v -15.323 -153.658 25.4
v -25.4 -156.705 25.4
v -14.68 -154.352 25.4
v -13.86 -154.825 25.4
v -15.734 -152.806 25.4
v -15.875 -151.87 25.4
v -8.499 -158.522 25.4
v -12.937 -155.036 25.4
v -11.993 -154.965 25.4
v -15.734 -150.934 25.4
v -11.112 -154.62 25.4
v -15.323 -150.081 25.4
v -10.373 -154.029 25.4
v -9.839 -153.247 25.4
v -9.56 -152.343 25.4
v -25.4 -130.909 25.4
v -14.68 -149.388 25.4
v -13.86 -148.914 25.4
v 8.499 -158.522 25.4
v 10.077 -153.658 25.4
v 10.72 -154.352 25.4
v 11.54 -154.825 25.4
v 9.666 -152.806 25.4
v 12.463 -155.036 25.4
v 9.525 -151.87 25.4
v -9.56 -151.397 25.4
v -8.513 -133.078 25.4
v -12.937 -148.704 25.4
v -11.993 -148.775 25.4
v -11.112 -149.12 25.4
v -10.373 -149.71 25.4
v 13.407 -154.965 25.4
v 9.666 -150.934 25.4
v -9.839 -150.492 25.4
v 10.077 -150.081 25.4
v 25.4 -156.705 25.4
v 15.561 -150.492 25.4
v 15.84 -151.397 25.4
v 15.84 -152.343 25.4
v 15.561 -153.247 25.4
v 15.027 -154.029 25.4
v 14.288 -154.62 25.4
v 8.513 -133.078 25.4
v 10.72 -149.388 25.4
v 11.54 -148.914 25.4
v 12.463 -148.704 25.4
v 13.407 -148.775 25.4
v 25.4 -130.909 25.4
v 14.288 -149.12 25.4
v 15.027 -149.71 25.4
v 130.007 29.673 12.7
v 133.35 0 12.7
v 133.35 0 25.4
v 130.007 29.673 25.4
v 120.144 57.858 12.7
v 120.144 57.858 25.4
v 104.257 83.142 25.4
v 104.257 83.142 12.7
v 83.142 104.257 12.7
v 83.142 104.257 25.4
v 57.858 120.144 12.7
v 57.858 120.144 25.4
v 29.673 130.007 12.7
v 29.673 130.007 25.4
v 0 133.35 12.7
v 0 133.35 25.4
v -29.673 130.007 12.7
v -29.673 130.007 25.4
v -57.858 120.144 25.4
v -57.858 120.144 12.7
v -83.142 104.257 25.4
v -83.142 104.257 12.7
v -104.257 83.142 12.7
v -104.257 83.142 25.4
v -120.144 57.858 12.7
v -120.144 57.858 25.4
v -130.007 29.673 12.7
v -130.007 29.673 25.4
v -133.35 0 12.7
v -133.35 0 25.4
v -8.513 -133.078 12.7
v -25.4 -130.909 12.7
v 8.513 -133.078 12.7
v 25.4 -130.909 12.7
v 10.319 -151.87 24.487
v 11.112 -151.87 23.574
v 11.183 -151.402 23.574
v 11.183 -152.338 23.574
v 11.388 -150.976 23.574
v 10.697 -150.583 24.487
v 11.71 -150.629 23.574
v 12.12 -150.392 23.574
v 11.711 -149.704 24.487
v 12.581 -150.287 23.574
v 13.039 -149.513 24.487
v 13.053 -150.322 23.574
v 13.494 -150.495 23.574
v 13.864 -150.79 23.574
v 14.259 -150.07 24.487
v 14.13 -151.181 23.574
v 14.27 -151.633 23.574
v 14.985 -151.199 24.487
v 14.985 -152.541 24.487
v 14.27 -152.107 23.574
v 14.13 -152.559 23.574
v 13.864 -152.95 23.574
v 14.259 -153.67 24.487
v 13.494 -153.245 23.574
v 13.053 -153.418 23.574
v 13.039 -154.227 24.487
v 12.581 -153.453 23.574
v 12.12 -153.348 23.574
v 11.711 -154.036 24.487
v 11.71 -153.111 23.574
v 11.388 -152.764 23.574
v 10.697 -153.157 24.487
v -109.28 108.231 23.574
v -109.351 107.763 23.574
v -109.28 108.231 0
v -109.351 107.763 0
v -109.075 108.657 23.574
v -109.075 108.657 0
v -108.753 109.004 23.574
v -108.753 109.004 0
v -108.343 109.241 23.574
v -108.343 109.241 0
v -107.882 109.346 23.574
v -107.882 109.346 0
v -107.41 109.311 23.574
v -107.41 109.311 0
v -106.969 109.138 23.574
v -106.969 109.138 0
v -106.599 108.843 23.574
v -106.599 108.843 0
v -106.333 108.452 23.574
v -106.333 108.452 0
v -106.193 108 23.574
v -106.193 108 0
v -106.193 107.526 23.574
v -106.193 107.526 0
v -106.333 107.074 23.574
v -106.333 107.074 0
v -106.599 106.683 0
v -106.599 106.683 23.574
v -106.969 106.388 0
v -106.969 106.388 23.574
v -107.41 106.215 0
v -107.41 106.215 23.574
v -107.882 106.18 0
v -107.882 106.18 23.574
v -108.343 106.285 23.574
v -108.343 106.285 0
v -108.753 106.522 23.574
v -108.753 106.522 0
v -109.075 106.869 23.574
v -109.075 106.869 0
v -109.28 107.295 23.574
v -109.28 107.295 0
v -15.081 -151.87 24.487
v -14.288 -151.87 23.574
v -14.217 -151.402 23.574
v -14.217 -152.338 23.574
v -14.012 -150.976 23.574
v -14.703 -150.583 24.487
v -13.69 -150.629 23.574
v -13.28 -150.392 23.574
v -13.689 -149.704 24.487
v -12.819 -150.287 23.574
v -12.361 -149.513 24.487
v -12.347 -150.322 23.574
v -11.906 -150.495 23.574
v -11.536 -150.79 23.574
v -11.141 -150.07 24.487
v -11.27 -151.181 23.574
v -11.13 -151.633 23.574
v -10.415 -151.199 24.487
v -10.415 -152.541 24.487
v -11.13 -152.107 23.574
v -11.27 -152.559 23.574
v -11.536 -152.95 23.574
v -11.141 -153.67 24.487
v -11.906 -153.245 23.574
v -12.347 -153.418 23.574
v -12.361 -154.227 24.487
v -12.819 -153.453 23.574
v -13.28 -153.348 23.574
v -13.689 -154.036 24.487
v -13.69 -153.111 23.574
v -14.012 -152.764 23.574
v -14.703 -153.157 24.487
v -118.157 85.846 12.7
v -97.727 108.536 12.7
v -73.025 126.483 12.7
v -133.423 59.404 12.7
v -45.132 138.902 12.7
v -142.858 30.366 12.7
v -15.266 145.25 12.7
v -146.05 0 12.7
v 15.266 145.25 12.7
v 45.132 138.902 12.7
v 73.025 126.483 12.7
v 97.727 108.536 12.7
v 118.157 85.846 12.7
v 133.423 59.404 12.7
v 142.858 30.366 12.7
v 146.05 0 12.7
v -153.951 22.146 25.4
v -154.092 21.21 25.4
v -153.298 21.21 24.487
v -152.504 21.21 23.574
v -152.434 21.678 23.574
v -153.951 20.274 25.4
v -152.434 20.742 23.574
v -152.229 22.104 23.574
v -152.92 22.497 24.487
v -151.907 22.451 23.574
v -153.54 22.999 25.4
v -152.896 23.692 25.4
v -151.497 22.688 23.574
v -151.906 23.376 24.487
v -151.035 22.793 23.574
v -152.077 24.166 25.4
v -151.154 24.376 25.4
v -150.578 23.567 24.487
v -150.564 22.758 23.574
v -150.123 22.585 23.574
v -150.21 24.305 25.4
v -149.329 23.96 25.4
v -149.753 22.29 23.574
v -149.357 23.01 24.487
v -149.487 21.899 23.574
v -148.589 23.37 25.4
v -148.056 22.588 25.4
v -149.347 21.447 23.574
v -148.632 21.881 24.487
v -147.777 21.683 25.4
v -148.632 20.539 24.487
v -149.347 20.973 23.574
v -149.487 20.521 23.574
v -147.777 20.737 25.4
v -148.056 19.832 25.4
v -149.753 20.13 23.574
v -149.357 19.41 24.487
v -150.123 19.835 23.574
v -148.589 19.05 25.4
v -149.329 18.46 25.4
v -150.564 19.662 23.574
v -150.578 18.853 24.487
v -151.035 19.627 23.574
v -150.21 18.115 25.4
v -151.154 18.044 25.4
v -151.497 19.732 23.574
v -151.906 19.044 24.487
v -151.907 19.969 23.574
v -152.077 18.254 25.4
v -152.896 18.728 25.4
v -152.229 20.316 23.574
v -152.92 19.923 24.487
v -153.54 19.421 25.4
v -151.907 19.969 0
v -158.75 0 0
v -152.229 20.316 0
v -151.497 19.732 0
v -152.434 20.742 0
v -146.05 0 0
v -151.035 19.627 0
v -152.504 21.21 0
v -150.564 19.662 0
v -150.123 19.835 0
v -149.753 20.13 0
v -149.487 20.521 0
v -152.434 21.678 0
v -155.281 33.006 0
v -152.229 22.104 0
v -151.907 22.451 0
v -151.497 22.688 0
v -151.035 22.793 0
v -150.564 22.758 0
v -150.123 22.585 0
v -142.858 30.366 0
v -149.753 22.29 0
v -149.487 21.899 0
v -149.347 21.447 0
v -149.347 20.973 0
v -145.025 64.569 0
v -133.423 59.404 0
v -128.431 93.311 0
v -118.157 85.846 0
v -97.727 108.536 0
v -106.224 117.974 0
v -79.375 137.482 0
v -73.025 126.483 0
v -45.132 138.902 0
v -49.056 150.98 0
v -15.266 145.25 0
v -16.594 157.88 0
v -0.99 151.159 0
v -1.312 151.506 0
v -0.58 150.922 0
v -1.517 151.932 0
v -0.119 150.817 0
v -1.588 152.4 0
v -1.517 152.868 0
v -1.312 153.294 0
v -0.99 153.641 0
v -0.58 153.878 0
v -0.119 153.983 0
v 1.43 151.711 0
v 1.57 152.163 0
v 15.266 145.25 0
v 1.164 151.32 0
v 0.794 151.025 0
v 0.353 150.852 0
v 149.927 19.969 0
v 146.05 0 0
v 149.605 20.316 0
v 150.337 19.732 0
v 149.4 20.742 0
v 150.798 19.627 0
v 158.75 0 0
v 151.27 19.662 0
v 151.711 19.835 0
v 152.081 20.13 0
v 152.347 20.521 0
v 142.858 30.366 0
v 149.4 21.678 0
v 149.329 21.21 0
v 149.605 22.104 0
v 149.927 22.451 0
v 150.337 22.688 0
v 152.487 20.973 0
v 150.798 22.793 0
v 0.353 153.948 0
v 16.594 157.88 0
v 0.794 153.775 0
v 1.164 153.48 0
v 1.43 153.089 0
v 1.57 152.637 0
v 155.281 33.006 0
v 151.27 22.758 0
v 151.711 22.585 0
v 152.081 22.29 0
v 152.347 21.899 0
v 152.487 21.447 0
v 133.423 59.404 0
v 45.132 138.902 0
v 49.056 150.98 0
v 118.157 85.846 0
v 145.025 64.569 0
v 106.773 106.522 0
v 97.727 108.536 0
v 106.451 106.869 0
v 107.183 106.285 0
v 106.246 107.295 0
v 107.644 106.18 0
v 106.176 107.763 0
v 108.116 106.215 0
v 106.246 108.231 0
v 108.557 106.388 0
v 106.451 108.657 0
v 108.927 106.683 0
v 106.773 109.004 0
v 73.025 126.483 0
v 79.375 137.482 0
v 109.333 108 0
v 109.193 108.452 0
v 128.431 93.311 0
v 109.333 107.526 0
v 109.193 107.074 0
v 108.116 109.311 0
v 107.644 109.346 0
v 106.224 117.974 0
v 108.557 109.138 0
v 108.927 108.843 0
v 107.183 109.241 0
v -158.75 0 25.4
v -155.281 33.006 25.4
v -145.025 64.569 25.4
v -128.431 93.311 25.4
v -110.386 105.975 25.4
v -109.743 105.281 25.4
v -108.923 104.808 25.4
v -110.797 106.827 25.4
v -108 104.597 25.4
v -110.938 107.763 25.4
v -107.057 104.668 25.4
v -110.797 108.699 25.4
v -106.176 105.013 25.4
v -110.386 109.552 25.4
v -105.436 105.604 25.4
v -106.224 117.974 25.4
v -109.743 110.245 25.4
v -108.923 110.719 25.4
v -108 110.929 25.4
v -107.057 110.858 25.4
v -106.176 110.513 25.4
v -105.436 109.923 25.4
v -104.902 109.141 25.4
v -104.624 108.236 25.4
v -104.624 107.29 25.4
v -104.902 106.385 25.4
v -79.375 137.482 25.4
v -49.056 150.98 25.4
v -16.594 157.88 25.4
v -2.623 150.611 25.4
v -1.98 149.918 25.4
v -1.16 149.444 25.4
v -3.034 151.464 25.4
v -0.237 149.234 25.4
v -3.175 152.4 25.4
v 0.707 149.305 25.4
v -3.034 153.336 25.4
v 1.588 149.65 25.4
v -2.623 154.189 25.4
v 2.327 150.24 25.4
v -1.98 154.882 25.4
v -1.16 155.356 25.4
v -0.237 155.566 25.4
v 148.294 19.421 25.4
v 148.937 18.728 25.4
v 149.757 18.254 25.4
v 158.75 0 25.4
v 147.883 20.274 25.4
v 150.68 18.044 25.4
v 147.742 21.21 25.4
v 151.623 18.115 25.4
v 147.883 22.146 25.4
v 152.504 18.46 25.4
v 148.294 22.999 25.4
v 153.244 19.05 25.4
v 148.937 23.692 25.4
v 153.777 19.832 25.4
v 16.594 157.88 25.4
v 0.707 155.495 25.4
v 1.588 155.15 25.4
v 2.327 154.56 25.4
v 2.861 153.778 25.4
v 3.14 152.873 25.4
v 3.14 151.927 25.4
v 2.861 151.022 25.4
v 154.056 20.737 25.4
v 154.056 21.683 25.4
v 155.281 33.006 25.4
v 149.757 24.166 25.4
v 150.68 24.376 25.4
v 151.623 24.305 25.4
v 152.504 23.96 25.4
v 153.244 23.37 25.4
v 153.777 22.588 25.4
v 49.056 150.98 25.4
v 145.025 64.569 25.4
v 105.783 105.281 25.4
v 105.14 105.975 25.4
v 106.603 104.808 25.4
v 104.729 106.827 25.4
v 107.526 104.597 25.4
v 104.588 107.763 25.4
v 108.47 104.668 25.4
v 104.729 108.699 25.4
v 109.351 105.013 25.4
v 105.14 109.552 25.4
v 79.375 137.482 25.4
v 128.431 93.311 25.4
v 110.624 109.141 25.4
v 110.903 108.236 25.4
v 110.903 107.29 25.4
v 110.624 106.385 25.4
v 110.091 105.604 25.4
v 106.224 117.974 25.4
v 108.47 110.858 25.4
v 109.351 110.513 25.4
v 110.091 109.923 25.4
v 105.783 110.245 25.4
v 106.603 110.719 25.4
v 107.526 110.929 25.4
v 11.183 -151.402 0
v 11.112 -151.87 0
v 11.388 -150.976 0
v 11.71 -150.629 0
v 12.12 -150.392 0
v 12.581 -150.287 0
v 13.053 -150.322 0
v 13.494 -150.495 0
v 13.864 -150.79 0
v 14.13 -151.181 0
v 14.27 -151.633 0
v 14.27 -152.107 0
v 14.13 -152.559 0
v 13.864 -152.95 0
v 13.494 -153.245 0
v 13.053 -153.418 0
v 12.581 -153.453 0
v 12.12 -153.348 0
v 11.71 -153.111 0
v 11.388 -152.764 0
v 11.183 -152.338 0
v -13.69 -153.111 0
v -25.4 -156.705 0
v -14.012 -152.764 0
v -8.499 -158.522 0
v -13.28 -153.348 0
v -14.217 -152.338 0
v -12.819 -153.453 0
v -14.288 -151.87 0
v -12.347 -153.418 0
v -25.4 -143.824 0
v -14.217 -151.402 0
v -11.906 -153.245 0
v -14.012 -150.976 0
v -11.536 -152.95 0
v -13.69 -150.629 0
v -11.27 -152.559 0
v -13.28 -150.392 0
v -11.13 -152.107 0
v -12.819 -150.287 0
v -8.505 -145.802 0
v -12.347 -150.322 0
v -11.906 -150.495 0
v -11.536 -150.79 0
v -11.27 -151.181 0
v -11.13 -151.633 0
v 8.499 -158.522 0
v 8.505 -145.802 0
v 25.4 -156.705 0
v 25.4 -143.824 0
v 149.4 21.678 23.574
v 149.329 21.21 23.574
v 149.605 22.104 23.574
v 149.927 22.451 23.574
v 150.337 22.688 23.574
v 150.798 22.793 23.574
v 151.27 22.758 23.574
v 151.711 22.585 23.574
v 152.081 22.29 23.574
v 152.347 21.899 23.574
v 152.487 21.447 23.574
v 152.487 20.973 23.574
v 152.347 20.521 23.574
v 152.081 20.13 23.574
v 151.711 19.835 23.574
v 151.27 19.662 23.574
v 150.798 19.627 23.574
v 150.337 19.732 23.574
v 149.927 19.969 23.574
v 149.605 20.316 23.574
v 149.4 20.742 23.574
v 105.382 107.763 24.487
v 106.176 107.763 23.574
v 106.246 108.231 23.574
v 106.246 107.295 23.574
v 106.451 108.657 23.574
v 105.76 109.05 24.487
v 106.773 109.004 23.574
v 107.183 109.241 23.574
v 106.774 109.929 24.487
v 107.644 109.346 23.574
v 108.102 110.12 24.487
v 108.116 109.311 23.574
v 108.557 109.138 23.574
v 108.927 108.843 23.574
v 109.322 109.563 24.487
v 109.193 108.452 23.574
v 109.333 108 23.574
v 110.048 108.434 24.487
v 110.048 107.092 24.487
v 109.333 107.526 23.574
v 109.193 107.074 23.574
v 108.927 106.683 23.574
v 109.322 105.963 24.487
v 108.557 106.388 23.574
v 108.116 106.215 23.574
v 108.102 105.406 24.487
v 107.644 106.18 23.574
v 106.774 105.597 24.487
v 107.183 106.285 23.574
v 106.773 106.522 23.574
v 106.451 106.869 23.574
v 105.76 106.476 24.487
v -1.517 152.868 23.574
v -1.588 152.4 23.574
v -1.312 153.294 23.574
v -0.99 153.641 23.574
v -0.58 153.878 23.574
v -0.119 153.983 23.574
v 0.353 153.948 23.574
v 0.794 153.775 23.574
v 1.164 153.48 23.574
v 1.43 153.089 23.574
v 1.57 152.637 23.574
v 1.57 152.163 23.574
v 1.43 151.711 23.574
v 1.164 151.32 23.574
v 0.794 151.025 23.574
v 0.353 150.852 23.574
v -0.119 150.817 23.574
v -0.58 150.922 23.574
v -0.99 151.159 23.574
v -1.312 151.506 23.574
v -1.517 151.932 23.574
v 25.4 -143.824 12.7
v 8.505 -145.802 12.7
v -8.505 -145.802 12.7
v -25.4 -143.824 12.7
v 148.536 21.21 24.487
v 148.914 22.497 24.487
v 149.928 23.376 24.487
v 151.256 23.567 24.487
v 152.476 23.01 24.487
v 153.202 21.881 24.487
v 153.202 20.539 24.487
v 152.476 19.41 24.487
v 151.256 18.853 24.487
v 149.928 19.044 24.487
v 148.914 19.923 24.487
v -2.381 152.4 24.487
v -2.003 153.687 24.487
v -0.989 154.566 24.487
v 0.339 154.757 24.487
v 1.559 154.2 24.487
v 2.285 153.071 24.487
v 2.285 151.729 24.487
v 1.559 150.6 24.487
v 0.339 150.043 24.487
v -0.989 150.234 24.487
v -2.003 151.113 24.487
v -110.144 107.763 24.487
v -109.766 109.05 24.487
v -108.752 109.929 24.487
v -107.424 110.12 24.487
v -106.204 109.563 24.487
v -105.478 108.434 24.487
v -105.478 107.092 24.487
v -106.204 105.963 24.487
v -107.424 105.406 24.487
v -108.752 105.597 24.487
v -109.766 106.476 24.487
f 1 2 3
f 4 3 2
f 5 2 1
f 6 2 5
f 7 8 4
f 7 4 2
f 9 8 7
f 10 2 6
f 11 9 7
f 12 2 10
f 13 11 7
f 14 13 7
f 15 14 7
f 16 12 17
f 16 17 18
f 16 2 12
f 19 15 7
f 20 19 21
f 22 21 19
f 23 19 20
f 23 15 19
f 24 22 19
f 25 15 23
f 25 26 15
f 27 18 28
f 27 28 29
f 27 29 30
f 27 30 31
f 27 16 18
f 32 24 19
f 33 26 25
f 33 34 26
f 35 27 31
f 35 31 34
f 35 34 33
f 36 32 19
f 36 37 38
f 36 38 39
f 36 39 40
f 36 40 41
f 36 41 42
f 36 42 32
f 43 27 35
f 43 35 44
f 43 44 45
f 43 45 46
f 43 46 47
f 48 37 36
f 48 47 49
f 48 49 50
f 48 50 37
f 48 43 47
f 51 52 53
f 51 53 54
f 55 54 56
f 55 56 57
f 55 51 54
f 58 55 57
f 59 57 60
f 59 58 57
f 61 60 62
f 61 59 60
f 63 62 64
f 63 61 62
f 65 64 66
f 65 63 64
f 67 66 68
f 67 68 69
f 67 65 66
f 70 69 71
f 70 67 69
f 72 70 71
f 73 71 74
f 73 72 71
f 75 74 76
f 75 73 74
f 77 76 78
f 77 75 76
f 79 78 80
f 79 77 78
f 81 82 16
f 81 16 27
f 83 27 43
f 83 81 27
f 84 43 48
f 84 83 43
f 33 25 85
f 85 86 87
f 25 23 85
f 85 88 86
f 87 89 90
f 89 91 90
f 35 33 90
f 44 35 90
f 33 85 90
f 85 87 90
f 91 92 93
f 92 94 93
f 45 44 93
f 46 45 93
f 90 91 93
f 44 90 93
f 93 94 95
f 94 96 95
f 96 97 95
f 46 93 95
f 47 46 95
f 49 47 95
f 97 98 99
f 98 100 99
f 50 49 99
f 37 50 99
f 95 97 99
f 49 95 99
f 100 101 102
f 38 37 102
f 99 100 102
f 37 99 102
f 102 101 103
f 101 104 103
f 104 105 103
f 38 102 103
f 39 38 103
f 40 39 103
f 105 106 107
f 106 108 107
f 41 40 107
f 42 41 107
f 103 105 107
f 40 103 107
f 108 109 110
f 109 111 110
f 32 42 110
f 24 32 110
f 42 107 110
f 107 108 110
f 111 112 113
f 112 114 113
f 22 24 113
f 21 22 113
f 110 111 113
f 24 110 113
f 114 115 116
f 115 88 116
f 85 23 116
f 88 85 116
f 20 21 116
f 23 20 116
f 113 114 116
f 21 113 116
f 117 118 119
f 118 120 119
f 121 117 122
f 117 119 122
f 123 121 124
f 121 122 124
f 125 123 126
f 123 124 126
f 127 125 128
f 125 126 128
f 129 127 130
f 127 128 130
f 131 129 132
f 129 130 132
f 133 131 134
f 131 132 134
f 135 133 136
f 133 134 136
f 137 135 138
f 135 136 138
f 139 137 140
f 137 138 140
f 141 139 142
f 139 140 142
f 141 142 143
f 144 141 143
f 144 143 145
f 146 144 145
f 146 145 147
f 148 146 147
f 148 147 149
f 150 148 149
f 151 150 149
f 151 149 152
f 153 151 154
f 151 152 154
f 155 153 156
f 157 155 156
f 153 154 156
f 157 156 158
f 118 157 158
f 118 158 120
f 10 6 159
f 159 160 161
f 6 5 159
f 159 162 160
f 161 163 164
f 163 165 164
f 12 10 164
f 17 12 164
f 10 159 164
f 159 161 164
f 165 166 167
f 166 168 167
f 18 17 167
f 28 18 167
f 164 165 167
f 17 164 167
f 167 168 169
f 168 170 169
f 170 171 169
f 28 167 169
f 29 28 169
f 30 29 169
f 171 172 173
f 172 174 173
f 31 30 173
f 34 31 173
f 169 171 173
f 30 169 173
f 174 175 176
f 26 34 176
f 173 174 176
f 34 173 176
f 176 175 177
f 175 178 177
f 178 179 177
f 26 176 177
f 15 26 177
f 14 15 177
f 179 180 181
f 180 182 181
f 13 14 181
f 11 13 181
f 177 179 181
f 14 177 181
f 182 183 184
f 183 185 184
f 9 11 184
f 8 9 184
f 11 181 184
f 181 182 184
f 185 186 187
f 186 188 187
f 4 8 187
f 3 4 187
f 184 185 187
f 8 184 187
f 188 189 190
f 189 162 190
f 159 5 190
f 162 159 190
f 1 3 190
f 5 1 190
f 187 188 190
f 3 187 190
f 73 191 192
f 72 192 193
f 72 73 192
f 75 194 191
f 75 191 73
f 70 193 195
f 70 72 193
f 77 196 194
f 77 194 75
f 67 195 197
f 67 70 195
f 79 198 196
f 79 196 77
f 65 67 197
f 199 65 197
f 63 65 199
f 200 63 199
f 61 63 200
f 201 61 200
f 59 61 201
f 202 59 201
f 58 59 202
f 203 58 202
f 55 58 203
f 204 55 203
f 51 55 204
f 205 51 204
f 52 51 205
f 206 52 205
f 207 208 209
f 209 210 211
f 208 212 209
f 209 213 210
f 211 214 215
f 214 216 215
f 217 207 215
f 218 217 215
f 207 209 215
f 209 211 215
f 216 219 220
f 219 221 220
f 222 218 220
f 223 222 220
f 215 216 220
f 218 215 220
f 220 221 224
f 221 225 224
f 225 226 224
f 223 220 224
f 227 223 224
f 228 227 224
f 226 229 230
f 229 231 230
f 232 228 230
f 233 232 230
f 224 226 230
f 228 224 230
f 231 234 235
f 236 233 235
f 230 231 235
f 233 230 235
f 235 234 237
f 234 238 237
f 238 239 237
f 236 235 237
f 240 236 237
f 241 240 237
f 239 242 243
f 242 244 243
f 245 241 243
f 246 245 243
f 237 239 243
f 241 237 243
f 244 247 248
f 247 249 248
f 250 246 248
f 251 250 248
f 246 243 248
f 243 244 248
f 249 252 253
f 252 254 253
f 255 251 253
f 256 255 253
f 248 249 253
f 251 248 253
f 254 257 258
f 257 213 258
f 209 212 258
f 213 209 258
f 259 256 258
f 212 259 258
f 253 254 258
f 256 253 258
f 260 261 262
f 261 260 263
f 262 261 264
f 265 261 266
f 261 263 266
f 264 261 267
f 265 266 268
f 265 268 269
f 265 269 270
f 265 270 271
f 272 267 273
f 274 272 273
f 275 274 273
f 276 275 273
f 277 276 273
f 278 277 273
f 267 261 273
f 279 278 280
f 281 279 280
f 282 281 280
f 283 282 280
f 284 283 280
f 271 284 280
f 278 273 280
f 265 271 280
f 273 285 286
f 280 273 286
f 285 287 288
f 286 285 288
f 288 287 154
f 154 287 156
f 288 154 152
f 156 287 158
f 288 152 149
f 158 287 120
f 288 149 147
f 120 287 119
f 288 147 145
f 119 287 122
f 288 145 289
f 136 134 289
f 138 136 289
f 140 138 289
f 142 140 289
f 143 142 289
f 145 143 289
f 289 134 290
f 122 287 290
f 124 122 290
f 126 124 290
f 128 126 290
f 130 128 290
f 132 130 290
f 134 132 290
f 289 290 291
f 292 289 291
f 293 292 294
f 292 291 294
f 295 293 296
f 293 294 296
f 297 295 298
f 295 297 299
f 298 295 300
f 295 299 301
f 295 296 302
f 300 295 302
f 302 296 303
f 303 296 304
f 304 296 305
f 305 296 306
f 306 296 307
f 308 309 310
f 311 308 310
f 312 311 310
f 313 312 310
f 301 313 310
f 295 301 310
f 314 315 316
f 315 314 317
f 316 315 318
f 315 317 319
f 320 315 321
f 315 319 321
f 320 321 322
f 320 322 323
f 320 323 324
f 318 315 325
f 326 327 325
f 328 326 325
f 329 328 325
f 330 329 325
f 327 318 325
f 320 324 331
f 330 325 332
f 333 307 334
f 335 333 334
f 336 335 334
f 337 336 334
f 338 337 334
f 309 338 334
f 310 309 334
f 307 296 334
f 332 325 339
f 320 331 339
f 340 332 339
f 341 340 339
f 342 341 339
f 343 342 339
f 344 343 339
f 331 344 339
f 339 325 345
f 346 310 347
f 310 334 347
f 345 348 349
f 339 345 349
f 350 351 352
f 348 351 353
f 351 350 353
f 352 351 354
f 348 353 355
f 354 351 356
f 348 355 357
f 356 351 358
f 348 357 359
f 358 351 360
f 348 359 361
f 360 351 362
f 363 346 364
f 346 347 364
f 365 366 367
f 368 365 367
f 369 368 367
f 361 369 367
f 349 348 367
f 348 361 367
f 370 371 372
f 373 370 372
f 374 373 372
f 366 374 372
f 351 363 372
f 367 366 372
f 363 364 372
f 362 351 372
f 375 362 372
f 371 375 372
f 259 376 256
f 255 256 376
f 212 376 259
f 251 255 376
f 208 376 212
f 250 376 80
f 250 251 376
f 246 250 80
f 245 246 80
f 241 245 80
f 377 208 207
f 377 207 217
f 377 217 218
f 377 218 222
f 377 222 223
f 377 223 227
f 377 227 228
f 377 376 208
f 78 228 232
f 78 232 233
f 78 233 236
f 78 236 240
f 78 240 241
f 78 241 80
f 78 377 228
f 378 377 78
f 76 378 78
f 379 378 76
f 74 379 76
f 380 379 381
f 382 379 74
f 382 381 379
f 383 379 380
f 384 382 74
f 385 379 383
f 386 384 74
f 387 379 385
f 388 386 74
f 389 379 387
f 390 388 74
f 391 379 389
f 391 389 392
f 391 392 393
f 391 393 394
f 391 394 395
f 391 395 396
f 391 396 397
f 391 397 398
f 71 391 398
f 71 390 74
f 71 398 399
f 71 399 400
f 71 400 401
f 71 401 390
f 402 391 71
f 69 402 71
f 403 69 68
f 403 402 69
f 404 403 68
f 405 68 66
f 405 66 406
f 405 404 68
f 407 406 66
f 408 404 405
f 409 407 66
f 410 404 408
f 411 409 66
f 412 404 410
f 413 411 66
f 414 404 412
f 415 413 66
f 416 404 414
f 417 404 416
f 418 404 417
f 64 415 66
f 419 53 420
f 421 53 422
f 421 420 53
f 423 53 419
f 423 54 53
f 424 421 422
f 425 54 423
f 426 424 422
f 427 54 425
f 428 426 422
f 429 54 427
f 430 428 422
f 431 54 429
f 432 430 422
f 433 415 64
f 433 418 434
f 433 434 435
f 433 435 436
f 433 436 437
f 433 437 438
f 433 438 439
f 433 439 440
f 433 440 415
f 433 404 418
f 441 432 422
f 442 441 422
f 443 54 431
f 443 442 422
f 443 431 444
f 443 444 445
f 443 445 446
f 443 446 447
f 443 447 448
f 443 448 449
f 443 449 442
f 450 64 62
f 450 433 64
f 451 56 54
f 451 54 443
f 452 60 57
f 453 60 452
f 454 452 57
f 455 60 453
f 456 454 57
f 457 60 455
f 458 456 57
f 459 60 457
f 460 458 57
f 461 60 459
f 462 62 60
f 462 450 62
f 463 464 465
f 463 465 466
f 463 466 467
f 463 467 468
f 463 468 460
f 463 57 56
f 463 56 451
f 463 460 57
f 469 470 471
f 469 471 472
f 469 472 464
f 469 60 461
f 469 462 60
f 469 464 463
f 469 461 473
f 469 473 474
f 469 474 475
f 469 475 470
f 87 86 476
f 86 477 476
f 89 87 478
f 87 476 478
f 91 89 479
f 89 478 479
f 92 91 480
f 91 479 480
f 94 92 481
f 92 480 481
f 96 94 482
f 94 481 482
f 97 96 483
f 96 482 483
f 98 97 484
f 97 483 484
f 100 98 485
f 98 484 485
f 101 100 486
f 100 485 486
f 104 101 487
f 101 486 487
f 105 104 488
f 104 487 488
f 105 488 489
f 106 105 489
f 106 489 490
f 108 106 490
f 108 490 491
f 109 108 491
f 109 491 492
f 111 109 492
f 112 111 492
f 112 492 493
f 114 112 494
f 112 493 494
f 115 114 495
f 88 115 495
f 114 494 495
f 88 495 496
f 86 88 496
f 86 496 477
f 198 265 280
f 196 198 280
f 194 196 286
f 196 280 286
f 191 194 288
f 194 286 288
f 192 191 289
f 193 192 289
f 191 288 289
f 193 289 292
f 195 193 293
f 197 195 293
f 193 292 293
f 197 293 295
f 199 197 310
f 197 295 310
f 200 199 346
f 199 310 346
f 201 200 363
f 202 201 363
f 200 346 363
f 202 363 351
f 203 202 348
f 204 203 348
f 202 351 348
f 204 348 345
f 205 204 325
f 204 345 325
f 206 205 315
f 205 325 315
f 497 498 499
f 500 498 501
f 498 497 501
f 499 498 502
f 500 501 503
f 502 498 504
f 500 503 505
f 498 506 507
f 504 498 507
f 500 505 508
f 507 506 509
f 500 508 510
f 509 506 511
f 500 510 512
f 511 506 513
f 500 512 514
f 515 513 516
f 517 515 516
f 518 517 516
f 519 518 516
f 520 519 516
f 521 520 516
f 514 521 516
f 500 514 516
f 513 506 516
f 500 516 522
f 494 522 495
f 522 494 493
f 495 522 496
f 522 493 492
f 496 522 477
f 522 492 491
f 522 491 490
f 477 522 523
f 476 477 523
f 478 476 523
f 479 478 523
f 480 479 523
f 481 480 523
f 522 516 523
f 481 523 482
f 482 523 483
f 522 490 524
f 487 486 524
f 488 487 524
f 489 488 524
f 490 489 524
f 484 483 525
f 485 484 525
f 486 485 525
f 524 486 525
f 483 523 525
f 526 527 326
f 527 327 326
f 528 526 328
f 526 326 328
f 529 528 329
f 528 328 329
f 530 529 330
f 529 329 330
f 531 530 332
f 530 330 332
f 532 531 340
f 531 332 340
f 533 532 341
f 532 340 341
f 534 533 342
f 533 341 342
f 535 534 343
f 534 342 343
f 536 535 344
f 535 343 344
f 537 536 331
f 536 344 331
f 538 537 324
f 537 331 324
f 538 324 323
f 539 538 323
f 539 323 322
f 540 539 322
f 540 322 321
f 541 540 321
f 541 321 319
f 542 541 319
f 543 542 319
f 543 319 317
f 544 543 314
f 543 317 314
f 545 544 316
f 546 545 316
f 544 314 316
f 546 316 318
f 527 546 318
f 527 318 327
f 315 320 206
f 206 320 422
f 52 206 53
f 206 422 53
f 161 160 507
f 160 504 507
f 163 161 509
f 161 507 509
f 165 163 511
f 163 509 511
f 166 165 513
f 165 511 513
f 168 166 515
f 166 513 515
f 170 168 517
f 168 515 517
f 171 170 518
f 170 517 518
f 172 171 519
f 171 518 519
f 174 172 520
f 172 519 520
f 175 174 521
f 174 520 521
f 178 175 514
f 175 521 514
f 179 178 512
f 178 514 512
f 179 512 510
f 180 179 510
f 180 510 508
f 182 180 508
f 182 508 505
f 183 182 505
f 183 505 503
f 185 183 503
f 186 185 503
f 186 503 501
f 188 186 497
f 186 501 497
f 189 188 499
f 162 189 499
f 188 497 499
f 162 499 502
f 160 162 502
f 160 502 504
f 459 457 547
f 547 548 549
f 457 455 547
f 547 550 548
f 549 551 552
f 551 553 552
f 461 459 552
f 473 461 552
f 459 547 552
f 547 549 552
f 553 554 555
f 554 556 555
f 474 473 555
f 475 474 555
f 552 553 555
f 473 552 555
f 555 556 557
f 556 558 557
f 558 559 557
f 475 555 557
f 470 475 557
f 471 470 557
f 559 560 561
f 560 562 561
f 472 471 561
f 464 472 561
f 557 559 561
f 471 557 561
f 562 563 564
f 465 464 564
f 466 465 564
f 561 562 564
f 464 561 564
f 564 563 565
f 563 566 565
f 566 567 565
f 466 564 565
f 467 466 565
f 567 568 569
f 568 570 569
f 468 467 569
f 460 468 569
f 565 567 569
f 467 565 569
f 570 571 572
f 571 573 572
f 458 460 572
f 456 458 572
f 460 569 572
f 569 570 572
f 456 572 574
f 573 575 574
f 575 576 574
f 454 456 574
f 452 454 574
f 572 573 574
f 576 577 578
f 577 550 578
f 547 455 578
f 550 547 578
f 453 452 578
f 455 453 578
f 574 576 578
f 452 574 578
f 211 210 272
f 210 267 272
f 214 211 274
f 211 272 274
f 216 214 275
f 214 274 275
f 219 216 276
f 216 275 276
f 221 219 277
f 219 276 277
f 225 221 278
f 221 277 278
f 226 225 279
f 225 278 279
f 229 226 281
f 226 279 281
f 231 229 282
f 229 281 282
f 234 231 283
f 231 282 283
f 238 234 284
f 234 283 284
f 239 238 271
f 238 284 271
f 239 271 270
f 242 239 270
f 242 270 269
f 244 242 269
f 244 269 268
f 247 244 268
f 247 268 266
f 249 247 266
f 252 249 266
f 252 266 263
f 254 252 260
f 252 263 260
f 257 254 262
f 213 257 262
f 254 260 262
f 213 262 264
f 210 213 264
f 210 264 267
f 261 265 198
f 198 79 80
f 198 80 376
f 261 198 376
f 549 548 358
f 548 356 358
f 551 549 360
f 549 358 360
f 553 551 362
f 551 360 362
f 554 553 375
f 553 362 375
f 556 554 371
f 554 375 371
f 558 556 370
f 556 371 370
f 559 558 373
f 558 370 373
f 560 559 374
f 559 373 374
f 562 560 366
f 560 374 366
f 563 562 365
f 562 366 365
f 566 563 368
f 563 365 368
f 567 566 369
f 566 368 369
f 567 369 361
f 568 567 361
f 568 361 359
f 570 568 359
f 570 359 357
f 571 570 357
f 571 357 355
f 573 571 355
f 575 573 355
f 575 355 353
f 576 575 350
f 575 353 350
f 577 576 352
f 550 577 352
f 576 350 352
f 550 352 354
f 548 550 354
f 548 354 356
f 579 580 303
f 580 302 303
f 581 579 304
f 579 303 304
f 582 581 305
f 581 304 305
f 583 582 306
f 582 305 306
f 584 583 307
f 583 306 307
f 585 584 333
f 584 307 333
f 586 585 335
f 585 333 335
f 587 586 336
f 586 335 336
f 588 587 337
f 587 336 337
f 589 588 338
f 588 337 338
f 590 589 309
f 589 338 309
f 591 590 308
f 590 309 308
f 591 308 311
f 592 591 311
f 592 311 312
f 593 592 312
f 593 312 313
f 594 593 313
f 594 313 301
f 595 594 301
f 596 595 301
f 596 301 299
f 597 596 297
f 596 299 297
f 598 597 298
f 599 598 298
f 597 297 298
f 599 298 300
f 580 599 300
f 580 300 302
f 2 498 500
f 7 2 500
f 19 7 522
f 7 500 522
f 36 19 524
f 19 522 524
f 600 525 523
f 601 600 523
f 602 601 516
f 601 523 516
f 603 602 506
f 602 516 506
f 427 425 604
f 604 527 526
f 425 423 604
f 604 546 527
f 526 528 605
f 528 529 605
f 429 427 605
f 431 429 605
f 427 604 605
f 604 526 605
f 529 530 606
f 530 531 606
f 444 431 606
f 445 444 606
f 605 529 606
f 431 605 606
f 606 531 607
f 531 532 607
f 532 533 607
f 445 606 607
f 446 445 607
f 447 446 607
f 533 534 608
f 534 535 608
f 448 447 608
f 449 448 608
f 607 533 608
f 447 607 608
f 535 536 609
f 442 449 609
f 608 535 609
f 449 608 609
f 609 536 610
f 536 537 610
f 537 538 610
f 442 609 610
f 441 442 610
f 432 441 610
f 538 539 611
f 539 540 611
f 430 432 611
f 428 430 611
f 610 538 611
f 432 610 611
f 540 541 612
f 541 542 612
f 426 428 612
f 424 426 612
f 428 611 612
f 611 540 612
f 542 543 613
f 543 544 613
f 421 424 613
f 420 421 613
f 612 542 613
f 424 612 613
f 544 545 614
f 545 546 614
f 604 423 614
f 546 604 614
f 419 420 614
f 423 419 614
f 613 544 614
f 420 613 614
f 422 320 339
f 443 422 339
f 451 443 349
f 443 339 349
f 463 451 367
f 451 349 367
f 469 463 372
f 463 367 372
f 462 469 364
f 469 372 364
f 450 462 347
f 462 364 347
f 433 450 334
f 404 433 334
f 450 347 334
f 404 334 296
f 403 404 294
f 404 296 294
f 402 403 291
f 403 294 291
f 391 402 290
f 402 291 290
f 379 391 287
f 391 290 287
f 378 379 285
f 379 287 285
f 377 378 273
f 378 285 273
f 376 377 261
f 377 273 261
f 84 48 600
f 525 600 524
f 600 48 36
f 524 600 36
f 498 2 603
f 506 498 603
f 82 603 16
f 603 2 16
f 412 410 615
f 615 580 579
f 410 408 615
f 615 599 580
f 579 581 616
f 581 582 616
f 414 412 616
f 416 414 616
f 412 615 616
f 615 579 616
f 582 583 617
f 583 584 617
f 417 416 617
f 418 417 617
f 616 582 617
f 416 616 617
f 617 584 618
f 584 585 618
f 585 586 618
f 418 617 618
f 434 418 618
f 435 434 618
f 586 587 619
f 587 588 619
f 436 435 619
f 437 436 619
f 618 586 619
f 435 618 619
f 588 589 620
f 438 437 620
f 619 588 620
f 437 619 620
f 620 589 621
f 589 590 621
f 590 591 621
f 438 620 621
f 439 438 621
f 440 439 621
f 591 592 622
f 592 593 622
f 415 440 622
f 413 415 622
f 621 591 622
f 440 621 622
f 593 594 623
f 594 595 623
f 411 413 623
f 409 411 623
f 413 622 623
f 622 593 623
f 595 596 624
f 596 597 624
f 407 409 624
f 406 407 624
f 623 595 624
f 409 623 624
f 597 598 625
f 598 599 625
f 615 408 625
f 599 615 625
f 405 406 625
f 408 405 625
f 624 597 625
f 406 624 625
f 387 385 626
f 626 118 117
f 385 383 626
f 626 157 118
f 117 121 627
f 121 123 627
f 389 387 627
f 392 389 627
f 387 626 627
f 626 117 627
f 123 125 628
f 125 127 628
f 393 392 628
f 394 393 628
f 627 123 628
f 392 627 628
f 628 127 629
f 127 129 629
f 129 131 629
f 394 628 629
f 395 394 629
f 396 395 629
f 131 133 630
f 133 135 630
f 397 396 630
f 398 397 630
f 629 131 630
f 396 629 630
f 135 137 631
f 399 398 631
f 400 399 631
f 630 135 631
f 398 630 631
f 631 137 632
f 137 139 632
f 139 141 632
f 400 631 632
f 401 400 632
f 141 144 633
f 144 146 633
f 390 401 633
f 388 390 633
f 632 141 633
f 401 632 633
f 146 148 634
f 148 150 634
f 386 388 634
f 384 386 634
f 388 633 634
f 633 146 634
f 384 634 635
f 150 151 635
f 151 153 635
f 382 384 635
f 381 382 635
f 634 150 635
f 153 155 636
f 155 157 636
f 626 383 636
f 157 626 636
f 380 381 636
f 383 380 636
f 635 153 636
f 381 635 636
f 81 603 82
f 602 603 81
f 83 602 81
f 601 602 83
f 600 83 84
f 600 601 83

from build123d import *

# Parameters (mm, degrees)
F0_R           = 158.75
F0_R_2         = 133.35
F1_DEPTH       = 25.4
F2_R           = 146.05
F2_R_2         = 133.35
F3_DEPTH       = 12.7
F5_DEPTH       = 25.401
F7_D           = 3.175
F7_DEPTH       = 31.75
F7_CSINK_D     = 6.35
F7_CSINK_ANGLE = 82
F7_TIP         = 0.9538662327


with BuildPart() as f1:
    # F0 (on Top) → F1 (new body)
    with BuildSketch(Plane.XY):
        Circle(F0_R)
        Circle(F0_R_2, mode=Mode.SUBTRACT)
    extrude(amount=F1_DEPTH)

    # F2 (on face) → F3 (cut)
    with BuildSketch(Plane(origin=(0, 0, 0), x_dir=(1, 0, 0), z_dir=(0, 0, -1))):
        Circle(F2_R)
        Circle(F2_R_2, mode=Mode.SUBTRACT)
    extrude(amount=-F3_DEPTH, mode=Mode.SUBTRACT)

    # F4 (on face) → F5 (cut, through all)
    with BuildSketch(Plane.XY.offset(25.4)):
        with BuildLine():
            Line((158.75, 0), (133.35, 0))
            ThreePointArc((133.35, 0), (102.8817585872, -84.8384715209), (25.4, -130.9086036134))
            Line((25.4, -130.9086036134), (25.4, -156.7048260265))
            ThreePointArc((25.4, -156.7048260265), (120.9003980556, -102.8817585872), (158.75, 0))
        make_face()
        with BuildLine():
            ThreePointArc((-25.4, -130.9086036134), (-102.8817585872, -84.8384715209), (-133.35, 0))
            Line((-133.35, 0), (-158.75, 0))
            ThreePointArc((-158.75, 0), (-120.9003980556, -102.8817585872), (-25.4, -156.7048260265))
            Line((-25.4, -156.7048260265), (-25.4, -130.9086036134))
        make_face()
    extrude(amount=-F5_DEPTH, mode=Mode.SUBTRACT)

    # F7
    with Locations(Plane.XY.offset(25.4)):
        with Locations((-150.9168536762, 21.2099805863), (-107.7630734528, 107.7630734528), (0, 152.4), (107.7630734528, 107.7630734528), (150.9168536762, 21.2099805863), (-12.7, -151.8699114374), (12.7, -151.8699114374)):
            CounterSinkHole(F7_D / 2, F7_CSINK_D / 2, depth=F7_DEPTH, counter_sink_angle=F7_CSINK_ANGLE)
            with Locations((0, 0, -(F7_DEPTH + F7_TIP / 2))):  # 118° drill point
                Cone(0, F7_D / 2, F7_TIP, mode=Mode.SUBTRACT)


solid = f1.part
